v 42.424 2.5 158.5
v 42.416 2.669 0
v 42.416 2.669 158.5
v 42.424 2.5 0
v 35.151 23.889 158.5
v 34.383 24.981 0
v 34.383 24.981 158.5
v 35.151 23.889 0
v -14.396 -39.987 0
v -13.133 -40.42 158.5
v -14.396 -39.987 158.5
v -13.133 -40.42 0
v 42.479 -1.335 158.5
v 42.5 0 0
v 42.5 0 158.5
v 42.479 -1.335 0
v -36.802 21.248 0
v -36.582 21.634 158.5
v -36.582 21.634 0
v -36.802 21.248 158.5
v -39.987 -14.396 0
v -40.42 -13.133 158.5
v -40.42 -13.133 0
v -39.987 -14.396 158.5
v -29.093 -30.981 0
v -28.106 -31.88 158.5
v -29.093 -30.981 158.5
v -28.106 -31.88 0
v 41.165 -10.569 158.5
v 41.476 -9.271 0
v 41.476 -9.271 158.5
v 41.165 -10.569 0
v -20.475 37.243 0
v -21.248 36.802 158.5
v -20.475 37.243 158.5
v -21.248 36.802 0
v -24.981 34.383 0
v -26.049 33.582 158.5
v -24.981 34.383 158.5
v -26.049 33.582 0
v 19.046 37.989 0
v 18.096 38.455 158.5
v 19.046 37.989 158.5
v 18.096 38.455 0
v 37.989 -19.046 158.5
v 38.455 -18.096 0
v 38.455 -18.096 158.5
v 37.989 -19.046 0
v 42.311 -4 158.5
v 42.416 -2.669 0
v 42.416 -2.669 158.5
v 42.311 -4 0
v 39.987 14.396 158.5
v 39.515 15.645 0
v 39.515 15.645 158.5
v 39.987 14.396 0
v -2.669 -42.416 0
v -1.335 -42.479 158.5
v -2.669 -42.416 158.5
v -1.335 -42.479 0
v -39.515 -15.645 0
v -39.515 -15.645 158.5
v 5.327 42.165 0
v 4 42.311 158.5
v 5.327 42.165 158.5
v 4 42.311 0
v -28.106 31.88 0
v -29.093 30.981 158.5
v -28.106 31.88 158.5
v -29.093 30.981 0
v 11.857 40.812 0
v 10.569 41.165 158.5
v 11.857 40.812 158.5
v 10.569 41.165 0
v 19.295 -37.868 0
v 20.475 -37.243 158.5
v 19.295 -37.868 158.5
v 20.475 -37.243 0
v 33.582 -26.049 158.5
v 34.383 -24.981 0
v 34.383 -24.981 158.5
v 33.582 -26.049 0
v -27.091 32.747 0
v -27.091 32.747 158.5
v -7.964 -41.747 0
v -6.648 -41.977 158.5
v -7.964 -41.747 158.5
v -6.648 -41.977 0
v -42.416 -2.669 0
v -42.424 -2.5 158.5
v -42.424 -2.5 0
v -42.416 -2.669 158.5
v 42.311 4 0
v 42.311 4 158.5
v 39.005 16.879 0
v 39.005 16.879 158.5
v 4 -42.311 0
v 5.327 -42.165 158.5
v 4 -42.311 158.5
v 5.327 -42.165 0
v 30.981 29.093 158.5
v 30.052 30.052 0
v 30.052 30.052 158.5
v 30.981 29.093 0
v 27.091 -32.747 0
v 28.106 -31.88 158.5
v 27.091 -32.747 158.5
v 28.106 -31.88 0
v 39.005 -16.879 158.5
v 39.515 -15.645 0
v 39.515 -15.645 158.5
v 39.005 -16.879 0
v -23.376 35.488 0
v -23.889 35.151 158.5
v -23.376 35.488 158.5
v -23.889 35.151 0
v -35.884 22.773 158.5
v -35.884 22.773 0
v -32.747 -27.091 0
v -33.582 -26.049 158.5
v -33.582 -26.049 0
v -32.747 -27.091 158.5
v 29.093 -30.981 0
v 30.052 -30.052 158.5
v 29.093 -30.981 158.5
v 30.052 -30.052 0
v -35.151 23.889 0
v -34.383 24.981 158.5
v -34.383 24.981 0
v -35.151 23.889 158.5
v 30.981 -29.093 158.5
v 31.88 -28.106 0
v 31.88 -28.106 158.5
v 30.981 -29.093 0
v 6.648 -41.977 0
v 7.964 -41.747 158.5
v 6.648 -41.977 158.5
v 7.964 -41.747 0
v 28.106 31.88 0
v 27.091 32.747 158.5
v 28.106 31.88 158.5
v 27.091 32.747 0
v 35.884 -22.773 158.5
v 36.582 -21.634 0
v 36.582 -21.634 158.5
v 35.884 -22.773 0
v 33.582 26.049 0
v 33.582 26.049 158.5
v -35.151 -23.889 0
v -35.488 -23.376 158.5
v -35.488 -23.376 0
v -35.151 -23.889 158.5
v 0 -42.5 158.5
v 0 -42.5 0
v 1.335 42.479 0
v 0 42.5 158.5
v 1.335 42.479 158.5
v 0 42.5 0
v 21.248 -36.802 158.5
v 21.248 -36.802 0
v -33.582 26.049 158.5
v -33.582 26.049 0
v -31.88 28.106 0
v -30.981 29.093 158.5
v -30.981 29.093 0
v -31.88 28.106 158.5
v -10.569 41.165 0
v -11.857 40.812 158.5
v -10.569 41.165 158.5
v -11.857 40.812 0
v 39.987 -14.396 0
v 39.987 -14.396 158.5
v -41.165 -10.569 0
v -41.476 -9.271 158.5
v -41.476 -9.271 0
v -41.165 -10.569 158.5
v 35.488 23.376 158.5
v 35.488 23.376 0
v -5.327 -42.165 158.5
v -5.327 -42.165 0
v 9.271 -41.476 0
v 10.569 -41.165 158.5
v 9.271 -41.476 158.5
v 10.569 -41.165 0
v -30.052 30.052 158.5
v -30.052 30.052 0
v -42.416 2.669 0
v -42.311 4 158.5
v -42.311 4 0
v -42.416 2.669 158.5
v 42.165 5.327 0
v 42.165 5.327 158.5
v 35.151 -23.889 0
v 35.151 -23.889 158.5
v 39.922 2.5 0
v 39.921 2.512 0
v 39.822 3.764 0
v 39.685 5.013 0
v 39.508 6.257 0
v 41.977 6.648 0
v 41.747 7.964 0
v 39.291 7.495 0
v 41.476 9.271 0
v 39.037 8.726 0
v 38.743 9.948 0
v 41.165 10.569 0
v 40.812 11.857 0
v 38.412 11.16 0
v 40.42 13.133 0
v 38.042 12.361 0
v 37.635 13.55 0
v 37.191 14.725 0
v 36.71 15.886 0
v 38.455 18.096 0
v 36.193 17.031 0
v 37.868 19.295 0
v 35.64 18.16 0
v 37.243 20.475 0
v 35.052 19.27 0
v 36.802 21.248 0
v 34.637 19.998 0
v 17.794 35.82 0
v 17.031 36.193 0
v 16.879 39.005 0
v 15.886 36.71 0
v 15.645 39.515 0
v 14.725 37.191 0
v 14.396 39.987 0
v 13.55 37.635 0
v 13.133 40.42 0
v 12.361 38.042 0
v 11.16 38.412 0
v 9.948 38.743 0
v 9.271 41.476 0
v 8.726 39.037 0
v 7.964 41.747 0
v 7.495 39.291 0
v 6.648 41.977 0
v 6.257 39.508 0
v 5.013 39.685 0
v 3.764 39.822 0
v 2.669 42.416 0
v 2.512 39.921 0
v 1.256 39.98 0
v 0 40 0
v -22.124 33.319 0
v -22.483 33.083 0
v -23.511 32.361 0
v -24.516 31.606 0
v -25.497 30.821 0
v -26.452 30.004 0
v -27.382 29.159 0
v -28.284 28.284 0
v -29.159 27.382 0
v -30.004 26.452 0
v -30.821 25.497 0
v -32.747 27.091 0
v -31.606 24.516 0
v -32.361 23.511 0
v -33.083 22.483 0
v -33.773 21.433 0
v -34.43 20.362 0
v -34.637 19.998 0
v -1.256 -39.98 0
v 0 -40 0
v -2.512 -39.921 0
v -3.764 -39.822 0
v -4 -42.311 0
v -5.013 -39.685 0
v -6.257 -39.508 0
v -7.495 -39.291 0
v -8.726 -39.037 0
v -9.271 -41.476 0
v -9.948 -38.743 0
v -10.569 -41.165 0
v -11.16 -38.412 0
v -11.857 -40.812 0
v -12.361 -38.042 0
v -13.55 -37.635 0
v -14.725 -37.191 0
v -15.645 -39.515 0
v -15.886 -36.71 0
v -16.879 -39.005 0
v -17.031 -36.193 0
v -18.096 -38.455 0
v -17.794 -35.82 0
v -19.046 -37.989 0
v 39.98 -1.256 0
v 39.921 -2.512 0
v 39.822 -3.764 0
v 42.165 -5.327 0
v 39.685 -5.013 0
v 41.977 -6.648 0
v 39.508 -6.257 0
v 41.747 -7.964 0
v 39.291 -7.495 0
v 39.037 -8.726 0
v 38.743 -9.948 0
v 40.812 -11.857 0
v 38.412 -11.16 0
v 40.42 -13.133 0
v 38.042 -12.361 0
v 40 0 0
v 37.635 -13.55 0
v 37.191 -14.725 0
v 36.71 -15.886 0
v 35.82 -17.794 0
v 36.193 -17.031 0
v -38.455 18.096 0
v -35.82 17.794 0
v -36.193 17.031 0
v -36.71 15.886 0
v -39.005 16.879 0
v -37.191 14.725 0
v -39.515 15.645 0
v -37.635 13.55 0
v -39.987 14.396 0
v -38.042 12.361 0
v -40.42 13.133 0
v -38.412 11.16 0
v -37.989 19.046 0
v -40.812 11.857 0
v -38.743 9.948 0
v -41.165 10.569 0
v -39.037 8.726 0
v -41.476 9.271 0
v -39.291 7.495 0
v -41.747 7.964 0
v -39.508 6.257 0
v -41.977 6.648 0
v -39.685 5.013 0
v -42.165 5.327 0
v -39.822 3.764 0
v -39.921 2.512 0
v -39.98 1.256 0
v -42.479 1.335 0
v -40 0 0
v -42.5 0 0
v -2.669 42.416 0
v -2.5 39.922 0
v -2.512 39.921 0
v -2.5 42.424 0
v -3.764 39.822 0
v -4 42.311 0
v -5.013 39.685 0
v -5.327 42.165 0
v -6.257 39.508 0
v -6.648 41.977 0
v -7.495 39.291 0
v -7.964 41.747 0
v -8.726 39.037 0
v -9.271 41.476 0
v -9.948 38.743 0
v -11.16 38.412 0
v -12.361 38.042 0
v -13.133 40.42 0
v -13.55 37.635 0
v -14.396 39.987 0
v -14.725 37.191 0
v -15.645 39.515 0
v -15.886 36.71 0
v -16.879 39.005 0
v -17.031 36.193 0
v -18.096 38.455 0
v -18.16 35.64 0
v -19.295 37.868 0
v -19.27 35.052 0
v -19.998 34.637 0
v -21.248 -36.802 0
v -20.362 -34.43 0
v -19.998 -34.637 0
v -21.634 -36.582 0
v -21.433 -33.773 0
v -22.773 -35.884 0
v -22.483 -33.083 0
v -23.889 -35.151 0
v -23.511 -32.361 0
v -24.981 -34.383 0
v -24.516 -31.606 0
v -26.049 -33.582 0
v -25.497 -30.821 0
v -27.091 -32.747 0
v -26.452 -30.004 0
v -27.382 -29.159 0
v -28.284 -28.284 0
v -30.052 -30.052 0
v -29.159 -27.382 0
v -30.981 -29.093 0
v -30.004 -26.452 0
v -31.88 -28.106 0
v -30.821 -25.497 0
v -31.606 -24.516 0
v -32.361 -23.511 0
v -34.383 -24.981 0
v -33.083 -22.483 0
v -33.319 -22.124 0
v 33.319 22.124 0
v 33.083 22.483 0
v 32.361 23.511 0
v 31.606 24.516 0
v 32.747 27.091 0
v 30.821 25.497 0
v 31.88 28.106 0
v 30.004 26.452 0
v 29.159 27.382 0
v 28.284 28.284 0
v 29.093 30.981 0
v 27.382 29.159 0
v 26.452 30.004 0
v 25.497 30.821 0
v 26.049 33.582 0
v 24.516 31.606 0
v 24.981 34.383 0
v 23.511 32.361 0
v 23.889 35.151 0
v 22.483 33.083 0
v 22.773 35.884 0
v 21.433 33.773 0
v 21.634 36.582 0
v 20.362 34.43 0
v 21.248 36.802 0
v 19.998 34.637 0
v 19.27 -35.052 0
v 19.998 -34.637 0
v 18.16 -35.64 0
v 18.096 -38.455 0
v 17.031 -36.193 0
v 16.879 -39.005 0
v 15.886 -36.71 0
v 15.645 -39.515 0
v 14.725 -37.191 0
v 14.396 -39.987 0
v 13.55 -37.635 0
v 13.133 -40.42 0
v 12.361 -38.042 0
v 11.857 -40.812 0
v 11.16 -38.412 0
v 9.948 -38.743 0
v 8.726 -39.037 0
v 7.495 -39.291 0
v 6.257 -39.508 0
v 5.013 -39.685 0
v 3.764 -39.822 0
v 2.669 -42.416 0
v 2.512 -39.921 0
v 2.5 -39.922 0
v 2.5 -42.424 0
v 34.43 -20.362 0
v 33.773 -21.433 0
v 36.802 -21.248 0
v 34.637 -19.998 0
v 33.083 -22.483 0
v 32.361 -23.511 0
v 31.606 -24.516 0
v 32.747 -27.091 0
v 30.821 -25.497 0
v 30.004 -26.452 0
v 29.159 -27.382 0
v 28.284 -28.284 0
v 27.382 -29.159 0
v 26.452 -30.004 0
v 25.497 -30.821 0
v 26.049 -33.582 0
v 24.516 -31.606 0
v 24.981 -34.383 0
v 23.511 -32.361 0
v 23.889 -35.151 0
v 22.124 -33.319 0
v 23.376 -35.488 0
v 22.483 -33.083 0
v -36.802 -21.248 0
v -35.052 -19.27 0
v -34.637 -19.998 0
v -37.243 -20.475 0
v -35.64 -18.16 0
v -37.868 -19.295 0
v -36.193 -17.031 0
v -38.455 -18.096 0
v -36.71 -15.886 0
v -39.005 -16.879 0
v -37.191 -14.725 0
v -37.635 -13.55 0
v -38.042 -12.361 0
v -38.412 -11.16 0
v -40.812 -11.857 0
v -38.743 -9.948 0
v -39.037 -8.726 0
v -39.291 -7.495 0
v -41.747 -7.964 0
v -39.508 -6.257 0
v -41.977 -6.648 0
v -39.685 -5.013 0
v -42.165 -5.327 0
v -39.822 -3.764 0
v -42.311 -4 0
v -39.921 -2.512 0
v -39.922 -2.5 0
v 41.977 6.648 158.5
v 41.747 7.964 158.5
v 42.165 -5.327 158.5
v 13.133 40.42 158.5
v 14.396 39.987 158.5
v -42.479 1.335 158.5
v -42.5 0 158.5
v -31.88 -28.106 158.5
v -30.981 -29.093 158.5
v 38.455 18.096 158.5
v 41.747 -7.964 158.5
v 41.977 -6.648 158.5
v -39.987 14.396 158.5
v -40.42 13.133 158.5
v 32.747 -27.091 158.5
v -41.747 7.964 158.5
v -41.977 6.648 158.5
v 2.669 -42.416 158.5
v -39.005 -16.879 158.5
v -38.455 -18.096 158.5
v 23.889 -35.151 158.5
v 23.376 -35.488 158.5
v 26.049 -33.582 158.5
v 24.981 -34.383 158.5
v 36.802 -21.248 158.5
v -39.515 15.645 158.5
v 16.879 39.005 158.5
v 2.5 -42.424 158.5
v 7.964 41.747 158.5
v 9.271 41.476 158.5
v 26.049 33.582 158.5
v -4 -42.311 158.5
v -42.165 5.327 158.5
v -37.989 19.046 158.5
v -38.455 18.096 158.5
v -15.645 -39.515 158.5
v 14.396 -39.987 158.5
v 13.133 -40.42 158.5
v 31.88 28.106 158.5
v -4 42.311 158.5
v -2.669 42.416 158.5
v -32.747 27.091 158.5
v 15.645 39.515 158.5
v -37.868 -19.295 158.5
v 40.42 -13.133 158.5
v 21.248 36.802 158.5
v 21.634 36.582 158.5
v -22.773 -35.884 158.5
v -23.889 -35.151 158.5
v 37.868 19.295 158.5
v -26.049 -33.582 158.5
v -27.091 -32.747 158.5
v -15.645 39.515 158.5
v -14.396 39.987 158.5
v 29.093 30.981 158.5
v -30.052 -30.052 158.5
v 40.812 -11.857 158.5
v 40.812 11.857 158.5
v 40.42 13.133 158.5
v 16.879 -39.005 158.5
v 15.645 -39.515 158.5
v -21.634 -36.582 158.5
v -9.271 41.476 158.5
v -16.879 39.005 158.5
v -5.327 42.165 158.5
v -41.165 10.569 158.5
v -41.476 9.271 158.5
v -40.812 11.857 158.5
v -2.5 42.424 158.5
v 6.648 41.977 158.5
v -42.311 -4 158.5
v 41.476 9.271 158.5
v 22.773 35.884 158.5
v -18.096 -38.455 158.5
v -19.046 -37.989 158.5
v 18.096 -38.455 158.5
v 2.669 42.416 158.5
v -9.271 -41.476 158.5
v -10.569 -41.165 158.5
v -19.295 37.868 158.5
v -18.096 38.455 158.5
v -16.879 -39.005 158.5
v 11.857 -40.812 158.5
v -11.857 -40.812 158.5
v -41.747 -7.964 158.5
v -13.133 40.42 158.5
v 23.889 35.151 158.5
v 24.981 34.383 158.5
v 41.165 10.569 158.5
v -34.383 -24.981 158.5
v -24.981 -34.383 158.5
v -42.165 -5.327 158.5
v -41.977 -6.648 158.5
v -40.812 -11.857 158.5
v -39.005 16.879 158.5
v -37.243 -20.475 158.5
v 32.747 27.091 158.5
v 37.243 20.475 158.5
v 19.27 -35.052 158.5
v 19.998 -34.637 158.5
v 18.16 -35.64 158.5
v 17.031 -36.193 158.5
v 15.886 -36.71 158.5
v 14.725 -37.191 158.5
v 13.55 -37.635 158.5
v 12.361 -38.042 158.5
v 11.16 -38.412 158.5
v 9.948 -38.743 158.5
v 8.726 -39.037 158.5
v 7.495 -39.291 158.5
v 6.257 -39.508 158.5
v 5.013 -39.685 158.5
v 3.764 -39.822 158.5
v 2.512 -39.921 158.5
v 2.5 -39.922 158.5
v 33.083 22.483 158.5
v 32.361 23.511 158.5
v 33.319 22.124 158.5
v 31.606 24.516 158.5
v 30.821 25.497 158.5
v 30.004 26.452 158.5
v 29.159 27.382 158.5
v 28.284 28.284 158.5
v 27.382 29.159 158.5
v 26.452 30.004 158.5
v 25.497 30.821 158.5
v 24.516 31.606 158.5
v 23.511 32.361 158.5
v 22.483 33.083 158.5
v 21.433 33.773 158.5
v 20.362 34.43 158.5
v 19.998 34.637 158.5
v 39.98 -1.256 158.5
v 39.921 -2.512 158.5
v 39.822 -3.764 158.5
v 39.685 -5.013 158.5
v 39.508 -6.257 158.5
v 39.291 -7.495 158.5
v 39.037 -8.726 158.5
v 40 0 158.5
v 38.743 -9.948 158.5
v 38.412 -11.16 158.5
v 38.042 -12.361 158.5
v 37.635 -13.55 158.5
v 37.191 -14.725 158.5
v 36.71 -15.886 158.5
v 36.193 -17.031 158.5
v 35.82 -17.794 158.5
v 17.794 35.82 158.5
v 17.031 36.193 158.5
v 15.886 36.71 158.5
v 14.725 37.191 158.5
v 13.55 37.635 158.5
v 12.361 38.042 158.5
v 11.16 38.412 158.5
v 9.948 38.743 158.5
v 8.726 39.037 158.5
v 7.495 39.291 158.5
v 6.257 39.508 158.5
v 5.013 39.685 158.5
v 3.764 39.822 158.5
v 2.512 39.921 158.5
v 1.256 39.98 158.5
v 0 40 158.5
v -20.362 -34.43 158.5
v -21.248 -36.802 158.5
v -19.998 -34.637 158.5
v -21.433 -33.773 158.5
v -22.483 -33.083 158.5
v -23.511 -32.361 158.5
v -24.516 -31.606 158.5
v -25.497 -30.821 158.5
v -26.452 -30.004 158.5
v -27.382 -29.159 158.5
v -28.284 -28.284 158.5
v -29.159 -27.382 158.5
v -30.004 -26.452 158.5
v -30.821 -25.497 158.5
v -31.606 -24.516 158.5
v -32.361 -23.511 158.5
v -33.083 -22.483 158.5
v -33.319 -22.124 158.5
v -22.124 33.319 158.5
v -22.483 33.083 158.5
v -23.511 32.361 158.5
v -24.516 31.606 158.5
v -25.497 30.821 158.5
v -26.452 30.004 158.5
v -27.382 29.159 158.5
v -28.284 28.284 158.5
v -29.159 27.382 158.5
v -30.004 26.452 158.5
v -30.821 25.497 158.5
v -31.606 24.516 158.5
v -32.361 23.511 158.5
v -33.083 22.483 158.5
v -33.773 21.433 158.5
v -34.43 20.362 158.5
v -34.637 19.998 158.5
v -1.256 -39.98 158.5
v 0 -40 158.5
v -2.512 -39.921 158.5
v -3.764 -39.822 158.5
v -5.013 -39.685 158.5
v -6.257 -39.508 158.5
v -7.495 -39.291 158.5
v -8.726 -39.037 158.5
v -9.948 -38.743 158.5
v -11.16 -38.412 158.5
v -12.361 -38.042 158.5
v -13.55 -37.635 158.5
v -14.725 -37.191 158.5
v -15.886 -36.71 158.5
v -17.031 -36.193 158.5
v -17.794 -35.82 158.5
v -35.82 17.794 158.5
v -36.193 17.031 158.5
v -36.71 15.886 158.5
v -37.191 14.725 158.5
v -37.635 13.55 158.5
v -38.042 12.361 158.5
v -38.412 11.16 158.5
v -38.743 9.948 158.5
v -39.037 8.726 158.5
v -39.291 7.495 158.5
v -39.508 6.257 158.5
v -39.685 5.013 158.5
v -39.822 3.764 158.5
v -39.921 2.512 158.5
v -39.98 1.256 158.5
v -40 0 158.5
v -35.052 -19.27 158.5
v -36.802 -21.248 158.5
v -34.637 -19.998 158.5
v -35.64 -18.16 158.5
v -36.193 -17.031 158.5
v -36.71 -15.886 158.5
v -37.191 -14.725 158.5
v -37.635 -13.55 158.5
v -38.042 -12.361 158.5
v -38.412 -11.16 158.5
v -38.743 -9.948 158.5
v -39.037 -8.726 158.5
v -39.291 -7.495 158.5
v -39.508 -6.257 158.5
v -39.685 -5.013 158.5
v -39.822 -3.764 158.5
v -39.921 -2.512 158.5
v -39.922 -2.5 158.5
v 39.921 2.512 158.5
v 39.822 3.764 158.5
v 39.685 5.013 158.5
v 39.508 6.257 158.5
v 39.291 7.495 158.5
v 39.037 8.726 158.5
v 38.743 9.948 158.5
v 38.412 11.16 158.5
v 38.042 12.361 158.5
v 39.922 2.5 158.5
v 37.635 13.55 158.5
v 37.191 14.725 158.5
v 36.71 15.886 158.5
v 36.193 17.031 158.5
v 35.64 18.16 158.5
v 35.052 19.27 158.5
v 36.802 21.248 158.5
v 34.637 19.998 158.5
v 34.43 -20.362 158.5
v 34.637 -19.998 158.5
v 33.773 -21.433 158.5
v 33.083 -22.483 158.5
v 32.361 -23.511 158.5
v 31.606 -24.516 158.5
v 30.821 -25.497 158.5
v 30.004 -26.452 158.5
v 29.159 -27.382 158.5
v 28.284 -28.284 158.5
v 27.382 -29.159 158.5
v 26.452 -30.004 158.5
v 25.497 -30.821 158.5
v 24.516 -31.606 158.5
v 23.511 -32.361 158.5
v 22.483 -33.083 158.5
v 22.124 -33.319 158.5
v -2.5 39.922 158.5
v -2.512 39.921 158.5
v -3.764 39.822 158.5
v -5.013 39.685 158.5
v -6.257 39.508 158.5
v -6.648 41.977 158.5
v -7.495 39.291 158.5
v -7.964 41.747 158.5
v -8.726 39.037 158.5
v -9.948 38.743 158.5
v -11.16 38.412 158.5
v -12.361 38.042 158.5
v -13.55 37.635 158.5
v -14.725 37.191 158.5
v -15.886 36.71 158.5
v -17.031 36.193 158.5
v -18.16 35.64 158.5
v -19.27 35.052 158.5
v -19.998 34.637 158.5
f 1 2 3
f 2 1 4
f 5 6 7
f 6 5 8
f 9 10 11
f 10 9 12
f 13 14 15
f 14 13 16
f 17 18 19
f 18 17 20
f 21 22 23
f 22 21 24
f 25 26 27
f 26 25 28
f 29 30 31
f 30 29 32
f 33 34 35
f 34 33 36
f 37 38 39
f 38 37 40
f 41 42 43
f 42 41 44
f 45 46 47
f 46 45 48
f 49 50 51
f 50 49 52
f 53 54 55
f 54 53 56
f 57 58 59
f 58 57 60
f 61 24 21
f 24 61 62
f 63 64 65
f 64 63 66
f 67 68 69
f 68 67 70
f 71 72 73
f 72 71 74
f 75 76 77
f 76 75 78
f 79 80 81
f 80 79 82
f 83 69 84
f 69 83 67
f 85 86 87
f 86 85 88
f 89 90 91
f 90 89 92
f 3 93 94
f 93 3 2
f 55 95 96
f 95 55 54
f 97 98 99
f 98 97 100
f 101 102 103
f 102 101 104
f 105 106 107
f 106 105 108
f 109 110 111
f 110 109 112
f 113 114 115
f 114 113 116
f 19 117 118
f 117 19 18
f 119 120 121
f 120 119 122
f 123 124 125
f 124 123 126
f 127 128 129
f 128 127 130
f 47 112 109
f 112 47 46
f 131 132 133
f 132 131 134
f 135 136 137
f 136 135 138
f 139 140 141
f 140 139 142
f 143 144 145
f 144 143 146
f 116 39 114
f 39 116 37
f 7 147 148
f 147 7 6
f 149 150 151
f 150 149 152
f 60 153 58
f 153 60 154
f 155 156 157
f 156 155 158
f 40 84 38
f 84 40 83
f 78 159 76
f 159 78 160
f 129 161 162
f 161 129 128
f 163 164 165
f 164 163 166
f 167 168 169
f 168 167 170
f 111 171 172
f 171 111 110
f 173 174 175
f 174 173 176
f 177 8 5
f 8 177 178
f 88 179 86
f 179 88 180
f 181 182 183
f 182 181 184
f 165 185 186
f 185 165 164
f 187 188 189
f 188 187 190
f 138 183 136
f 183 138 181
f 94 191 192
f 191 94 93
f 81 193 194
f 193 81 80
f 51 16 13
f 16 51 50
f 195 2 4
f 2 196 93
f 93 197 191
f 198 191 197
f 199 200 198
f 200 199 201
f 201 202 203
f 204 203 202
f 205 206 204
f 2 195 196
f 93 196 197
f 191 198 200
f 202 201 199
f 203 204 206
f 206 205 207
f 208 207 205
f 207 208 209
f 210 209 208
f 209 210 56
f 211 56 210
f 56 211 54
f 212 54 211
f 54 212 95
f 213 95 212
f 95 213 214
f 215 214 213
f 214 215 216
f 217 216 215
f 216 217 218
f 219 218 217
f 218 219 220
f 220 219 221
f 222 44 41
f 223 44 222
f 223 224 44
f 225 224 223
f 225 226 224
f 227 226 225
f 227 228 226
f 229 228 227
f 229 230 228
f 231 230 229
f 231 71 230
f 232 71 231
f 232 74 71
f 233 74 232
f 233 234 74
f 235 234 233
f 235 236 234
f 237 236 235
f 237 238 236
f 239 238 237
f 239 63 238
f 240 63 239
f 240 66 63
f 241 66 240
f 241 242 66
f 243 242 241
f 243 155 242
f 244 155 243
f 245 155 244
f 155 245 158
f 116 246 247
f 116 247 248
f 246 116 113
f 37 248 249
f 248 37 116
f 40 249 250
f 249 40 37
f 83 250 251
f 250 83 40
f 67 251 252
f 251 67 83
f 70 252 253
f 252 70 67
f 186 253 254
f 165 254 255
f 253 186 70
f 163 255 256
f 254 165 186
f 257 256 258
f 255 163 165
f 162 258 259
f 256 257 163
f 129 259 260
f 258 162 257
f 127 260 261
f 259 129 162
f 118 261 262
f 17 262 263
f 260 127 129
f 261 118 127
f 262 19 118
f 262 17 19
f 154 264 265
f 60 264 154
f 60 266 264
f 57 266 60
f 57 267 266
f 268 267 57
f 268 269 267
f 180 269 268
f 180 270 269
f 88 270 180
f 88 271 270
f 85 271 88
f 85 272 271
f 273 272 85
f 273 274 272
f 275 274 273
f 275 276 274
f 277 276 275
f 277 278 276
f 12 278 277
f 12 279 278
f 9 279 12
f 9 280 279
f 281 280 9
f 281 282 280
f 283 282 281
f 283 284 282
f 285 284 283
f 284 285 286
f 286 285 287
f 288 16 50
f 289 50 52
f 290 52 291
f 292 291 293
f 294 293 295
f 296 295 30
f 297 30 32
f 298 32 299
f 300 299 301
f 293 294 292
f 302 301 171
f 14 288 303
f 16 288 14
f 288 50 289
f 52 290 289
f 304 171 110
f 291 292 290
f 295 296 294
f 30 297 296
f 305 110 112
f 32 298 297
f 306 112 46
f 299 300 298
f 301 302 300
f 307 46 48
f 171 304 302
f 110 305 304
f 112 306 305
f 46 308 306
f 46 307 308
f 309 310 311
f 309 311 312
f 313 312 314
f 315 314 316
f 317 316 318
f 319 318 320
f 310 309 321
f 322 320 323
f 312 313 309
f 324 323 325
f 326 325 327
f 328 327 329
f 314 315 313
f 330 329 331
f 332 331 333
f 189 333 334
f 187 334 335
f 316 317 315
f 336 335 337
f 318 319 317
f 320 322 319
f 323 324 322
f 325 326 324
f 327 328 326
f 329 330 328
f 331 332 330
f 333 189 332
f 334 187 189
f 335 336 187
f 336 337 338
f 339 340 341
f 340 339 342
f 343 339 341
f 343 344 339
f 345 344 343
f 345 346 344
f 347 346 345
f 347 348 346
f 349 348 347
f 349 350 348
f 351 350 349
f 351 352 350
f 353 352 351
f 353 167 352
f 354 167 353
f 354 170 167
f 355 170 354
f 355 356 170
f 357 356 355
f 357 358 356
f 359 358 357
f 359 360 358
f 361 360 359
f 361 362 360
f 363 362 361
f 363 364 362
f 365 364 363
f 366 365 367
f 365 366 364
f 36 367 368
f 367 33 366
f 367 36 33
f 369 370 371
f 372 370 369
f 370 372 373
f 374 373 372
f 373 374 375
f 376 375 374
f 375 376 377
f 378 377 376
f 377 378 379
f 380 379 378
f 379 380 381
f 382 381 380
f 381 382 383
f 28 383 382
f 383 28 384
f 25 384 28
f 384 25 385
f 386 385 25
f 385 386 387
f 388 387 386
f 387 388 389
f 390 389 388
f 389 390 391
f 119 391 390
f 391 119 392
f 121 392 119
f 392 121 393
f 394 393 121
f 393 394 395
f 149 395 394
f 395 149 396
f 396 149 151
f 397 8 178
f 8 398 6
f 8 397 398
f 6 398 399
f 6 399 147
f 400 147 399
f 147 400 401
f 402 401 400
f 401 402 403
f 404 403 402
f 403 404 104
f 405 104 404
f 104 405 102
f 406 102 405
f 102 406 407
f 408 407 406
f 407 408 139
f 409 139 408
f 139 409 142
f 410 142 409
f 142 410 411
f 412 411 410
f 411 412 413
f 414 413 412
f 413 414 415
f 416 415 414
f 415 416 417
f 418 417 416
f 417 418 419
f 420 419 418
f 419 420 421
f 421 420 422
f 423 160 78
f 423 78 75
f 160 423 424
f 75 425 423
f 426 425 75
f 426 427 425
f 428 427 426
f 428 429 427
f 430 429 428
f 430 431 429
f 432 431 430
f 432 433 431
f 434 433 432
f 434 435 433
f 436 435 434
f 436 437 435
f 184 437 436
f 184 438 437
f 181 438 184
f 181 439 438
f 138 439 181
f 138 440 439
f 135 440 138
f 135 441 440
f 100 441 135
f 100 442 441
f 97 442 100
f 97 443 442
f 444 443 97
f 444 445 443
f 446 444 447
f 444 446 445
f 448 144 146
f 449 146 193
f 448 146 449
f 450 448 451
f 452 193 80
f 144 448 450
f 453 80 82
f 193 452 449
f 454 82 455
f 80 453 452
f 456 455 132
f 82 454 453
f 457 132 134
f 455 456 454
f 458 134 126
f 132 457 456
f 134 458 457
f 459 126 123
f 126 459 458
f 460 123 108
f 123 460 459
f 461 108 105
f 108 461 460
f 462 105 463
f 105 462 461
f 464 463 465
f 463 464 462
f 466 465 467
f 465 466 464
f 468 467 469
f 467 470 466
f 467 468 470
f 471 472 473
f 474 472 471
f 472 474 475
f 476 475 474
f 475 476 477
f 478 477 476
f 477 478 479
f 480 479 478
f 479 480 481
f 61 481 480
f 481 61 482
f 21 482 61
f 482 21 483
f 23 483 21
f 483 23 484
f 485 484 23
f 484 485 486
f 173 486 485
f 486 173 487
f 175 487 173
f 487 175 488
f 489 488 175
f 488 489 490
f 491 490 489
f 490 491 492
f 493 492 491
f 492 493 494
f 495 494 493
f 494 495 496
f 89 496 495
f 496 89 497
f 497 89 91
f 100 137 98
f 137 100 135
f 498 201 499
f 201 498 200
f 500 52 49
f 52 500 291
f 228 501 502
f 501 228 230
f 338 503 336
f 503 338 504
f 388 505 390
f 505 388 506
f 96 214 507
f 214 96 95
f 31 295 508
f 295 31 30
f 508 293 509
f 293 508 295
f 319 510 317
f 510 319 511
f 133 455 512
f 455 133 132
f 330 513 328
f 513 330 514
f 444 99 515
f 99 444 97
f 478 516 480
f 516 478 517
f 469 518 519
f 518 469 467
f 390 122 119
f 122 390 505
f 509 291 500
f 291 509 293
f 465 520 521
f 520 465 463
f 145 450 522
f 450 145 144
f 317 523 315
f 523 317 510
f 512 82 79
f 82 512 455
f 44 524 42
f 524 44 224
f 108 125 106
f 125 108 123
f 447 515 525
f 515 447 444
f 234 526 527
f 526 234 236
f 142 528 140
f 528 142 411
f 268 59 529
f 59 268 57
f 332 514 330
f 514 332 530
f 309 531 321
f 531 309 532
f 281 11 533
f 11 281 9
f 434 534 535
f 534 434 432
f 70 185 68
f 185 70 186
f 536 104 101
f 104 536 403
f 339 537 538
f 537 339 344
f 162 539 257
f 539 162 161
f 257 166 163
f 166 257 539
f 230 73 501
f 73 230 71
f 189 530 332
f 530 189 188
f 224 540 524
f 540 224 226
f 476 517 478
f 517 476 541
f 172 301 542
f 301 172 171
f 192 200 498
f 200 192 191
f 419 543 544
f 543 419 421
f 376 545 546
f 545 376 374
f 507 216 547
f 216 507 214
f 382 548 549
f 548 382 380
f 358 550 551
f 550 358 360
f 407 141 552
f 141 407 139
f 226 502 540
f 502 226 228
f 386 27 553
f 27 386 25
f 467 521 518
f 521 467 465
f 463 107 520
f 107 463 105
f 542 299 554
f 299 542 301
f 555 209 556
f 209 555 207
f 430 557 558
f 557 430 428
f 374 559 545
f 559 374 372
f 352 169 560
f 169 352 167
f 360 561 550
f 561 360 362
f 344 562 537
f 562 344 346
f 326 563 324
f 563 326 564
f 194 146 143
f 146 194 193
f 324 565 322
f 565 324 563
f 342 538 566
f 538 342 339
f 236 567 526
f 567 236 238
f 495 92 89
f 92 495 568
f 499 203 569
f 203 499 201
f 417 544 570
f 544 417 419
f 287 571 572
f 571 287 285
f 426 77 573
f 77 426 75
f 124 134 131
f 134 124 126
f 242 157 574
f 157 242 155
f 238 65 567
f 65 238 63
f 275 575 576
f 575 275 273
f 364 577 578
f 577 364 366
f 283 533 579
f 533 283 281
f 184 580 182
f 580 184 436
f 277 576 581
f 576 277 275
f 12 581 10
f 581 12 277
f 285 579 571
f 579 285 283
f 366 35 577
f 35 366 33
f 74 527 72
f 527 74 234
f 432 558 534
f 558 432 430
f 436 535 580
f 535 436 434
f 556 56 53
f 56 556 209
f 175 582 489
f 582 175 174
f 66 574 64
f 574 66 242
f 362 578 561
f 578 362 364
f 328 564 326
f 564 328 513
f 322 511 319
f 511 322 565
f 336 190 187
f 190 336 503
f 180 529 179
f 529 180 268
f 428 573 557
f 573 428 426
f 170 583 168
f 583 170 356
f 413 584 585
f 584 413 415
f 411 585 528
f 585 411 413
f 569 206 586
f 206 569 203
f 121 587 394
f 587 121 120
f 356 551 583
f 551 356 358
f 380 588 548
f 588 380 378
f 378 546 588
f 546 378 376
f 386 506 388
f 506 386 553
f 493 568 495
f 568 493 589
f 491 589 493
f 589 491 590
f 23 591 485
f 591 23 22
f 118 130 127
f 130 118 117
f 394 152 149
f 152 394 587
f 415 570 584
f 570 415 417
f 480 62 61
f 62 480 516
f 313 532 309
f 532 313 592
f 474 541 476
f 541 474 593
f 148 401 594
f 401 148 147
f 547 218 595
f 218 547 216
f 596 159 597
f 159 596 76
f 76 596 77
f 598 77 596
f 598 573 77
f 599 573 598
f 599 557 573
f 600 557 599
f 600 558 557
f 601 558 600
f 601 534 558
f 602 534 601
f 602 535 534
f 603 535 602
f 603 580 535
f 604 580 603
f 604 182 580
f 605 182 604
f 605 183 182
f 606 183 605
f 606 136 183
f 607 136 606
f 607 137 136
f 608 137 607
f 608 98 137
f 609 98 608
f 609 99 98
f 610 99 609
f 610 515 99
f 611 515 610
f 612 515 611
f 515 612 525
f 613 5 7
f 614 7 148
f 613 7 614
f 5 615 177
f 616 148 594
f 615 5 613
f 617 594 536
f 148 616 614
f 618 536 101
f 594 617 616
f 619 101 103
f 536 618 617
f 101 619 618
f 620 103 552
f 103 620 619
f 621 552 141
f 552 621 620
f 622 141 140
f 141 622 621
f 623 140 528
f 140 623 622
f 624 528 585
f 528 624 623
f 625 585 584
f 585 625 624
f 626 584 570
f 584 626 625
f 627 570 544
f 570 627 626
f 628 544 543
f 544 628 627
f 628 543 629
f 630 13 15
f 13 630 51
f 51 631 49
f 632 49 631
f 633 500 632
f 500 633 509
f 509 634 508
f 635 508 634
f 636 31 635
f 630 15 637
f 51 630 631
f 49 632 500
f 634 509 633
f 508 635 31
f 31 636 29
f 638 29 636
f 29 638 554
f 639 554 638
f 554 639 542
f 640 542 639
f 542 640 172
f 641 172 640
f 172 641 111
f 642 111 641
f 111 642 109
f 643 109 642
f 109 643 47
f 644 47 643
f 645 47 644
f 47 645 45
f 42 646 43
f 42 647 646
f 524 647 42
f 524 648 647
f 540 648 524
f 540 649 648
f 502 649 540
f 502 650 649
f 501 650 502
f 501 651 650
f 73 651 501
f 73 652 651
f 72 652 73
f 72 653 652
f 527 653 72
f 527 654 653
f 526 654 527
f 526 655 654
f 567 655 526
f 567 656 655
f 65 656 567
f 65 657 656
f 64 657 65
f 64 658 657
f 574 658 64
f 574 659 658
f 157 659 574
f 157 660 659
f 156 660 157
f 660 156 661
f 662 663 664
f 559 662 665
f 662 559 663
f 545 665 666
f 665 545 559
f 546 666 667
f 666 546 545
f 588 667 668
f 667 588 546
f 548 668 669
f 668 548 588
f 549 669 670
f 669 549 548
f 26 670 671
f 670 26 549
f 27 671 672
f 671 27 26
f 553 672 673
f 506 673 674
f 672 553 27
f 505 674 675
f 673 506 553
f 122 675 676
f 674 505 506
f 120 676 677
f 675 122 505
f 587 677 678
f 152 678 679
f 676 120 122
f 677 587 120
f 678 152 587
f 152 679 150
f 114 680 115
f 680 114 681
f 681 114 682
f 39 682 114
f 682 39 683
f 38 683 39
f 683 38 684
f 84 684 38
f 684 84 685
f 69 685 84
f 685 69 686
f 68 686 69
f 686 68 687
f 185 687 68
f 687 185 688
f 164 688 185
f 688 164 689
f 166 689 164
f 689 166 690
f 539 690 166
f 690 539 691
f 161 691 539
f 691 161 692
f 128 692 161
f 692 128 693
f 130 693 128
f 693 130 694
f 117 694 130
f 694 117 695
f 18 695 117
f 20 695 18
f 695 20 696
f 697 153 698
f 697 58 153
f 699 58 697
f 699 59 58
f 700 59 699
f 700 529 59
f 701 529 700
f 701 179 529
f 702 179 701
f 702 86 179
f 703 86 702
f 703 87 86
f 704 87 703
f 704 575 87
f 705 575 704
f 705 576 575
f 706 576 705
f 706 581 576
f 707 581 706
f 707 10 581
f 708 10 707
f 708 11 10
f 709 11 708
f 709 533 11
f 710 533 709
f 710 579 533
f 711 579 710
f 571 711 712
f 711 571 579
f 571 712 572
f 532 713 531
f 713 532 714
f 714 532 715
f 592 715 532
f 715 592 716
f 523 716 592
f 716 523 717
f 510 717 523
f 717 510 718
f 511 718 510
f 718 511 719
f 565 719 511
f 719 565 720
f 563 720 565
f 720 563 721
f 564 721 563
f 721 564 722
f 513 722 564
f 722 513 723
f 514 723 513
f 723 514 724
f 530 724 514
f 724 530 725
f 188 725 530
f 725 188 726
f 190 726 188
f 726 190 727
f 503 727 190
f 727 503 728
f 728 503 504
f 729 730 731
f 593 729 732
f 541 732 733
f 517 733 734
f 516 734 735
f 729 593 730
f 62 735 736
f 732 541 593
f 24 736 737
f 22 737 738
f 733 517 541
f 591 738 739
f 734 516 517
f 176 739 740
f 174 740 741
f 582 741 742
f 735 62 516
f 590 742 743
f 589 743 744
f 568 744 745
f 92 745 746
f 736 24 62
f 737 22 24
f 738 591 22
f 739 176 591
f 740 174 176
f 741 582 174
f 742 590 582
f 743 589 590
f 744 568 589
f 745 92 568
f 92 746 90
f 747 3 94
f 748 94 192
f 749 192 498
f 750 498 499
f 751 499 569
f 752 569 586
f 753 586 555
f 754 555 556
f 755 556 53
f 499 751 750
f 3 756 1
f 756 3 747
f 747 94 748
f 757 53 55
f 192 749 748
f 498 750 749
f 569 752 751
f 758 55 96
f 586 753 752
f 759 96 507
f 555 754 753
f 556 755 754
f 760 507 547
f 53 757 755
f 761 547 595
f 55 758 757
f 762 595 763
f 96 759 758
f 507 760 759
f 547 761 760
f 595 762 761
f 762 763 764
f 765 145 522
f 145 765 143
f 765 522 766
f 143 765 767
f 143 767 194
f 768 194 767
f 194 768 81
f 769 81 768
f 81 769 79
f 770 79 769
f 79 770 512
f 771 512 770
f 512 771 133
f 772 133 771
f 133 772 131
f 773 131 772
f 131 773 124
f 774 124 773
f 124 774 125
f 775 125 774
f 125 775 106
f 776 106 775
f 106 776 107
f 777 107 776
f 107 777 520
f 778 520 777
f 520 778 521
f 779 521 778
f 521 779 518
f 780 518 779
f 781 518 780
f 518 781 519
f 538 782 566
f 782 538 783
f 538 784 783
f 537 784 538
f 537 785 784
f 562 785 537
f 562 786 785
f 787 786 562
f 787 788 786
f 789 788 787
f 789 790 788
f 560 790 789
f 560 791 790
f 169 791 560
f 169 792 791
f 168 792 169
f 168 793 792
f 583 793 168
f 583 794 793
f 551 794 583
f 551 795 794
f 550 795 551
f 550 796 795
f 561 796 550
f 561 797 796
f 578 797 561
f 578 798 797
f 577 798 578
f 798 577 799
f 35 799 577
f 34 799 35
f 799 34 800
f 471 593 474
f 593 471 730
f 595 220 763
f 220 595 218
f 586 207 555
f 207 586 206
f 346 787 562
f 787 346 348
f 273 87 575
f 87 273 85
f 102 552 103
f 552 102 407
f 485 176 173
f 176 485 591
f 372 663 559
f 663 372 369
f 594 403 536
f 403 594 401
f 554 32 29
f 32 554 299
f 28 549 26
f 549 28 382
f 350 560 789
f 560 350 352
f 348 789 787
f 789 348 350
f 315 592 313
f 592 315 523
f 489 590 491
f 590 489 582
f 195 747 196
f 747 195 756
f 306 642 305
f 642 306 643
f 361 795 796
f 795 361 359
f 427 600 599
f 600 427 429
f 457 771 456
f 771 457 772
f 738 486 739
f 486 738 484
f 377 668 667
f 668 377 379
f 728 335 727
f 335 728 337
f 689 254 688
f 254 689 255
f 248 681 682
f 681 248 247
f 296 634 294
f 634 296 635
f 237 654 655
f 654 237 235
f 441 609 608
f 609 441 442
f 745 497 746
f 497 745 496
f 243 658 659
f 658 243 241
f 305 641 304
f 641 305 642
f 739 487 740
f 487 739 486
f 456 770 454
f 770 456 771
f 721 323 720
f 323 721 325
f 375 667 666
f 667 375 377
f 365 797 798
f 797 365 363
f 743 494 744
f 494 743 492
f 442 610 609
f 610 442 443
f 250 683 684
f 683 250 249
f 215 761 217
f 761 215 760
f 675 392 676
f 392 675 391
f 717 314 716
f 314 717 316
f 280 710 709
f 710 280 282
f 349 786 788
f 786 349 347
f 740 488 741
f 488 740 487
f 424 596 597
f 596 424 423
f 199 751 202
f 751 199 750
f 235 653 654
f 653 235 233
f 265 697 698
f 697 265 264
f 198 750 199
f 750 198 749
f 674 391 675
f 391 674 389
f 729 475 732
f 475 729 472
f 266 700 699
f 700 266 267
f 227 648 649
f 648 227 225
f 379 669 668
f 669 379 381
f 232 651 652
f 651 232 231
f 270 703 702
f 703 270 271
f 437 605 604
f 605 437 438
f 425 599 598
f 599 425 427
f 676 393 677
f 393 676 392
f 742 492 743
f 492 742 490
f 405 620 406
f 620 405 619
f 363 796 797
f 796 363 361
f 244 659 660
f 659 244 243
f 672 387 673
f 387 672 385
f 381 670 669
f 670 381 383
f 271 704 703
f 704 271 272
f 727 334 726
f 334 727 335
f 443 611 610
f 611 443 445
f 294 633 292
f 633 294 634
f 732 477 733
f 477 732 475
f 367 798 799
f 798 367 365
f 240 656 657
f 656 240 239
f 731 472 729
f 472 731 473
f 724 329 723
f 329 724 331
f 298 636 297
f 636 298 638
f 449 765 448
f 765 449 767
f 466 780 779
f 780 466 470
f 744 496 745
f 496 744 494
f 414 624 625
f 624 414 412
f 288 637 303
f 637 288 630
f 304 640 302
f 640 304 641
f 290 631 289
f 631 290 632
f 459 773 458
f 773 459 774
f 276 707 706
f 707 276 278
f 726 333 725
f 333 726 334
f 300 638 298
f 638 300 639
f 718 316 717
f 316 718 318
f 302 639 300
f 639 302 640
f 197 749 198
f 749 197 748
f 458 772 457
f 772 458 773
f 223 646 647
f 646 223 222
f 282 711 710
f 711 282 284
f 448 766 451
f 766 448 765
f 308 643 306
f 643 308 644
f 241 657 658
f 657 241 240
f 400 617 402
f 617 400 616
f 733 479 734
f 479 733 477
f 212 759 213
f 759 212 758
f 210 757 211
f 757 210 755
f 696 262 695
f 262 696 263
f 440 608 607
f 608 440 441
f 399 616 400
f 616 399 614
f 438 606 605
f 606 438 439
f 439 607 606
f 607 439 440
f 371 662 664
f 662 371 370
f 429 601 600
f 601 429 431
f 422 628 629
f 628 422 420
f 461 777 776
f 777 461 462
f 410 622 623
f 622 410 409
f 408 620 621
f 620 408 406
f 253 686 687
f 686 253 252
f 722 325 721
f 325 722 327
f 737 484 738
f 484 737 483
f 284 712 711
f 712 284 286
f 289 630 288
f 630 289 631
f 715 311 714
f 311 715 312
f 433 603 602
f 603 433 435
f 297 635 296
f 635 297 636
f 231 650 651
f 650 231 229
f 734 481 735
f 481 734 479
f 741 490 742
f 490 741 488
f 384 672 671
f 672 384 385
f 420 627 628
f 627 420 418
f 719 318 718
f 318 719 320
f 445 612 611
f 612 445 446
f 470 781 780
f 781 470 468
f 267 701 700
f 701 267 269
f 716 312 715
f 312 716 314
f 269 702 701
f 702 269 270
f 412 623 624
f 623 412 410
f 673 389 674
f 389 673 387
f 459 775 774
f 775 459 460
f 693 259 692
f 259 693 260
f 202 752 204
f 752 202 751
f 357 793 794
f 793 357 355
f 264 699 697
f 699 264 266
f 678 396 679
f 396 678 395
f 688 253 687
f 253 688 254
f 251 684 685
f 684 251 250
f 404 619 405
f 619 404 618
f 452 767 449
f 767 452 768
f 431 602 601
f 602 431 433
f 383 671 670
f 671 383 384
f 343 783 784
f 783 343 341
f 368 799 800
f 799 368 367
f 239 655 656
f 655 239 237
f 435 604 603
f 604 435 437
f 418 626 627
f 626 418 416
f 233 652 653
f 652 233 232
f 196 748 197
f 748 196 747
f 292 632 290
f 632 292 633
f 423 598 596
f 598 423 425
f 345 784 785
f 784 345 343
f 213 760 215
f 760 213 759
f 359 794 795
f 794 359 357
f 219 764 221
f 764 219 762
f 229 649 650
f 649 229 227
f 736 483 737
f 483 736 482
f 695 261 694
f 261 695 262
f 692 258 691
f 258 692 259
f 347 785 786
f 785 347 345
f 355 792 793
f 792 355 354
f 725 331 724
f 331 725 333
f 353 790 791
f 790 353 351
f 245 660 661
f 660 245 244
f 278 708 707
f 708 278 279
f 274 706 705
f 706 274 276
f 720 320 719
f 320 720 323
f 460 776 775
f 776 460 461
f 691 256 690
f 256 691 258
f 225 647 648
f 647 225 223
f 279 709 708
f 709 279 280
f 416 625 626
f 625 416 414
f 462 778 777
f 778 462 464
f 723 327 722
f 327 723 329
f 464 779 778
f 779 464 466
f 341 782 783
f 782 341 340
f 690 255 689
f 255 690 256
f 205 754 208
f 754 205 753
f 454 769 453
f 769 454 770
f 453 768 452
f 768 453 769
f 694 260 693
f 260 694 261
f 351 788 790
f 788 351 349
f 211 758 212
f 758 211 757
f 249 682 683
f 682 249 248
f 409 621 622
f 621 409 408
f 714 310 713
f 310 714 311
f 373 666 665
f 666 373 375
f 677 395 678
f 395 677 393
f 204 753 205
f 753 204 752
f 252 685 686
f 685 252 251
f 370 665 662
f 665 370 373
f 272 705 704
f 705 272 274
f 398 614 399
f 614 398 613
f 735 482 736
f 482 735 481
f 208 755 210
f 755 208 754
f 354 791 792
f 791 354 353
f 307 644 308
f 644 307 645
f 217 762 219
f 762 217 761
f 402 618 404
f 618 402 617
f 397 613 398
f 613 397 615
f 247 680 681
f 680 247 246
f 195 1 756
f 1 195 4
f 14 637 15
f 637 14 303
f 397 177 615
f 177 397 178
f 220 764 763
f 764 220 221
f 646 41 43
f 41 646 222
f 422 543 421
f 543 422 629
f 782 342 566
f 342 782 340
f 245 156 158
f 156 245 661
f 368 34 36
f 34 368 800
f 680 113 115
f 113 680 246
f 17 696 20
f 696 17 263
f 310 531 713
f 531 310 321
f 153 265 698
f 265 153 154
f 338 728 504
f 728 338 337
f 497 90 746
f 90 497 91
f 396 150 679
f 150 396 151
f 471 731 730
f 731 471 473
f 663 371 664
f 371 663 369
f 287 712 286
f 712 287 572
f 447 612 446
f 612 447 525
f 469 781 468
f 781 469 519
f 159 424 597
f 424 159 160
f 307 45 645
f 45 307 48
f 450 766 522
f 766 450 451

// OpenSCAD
$fn= 200;
alto = 160;
offset = 2.5;
segmentos = 12;
angulo = 360 / segmentos;

r_int = 40;
r_ext = r_int + offset;

difference(){
    anillo();
    translate([0,0,-1])
    separador();
}
module anillo(){
    
    difference(){
        linear_extrude(alto-1.5)
        circle(r = r_ext);
        translate([0,0,-1])
        linear_extrude(alto)
        circle(r= r_int);
    }
}
module separador(){
    for(i = [0:angulo:360]){
        rotate([0,0,i])
        cube([r_ext,offset,alto]);
    }
}
